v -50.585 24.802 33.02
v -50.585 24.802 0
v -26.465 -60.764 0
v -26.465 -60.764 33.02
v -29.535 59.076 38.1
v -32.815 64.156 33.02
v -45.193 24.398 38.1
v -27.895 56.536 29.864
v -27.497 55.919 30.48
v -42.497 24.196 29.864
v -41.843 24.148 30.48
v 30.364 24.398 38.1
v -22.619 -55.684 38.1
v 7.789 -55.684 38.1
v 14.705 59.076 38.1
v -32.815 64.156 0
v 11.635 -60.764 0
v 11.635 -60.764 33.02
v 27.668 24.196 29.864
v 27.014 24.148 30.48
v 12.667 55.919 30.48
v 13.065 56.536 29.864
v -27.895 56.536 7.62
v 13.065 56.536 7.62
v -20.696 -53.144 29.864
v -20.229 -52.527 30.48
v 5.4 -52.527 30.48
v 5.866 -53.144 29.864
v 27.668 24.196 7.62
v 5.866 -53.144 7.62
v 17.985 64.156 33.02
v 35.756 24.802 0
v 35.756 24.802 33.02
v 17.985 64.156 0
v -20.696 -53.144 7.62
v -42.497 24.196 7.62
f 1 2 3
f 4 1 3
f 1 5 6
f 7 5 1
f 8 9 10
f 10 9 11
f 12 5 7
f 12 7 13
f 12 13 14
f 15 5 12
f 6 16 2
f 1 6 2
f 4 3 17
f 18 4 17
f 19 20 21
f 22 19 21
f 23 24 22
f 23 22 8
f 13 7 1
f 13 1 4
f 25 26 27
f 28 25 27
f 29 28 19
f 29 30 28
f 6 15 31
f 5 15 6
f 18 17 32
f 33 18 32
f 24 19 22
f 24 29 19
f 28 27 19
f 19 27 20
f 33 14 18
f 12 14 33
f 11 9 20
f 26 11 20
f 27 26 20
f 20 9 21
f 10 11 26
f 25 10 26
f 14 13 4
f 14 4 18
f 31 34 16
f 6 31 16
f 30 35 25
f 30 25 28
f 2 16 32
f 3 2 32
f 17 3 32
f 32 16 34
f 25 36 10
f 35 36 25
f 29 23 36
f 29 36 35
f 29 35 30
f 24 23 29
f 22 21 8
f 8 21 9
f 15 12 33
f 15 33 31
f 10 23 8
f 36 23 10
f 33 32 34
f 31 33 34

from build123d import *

# Parameters (mm, degrees)
F1_DEPTH = 38.1
F2_SIZE  = 5.08
F3_T     = -7.62


with BuildPart() as f1:
    # F0 (on Top) → F1 (new body)
    with BuildSketch(Plane.XY):
        Polygon((17.9854446539, 64.1556447676), (-32.8145553461, 64.1556447676), (-50.5846425152, 24.8016563801), (-26.4645553461, -60.7637069099), (11.6354446539, -60.7637069099), (35.7555318229, 24.8016563801), align=None)
    extrude(amount=F1_DEPTH)

    # F2
    f2_edges = [f1.edges().sort_by_distance(p)[0] for p in [
        (-41.699599, 44.478651, 38.1),
        (-7.414555, 64.155645, 38.1),
        (26.870488, 44.478651, 38.1),
        (23.695488, -17.981025, 38.1),
        (-38.524599, -17.981025, 38.1),
        (-7.414555, -60.763707, 38.1),
    ]]
    chamfer(f2_edges, length=F2_SIZE)

    # F3 (hollow: no face is removed)
    offset(amount=F3_T, kind=Kind.INTERSECTION, mode=Mode.SUBTRACT)


solid = f1.part
